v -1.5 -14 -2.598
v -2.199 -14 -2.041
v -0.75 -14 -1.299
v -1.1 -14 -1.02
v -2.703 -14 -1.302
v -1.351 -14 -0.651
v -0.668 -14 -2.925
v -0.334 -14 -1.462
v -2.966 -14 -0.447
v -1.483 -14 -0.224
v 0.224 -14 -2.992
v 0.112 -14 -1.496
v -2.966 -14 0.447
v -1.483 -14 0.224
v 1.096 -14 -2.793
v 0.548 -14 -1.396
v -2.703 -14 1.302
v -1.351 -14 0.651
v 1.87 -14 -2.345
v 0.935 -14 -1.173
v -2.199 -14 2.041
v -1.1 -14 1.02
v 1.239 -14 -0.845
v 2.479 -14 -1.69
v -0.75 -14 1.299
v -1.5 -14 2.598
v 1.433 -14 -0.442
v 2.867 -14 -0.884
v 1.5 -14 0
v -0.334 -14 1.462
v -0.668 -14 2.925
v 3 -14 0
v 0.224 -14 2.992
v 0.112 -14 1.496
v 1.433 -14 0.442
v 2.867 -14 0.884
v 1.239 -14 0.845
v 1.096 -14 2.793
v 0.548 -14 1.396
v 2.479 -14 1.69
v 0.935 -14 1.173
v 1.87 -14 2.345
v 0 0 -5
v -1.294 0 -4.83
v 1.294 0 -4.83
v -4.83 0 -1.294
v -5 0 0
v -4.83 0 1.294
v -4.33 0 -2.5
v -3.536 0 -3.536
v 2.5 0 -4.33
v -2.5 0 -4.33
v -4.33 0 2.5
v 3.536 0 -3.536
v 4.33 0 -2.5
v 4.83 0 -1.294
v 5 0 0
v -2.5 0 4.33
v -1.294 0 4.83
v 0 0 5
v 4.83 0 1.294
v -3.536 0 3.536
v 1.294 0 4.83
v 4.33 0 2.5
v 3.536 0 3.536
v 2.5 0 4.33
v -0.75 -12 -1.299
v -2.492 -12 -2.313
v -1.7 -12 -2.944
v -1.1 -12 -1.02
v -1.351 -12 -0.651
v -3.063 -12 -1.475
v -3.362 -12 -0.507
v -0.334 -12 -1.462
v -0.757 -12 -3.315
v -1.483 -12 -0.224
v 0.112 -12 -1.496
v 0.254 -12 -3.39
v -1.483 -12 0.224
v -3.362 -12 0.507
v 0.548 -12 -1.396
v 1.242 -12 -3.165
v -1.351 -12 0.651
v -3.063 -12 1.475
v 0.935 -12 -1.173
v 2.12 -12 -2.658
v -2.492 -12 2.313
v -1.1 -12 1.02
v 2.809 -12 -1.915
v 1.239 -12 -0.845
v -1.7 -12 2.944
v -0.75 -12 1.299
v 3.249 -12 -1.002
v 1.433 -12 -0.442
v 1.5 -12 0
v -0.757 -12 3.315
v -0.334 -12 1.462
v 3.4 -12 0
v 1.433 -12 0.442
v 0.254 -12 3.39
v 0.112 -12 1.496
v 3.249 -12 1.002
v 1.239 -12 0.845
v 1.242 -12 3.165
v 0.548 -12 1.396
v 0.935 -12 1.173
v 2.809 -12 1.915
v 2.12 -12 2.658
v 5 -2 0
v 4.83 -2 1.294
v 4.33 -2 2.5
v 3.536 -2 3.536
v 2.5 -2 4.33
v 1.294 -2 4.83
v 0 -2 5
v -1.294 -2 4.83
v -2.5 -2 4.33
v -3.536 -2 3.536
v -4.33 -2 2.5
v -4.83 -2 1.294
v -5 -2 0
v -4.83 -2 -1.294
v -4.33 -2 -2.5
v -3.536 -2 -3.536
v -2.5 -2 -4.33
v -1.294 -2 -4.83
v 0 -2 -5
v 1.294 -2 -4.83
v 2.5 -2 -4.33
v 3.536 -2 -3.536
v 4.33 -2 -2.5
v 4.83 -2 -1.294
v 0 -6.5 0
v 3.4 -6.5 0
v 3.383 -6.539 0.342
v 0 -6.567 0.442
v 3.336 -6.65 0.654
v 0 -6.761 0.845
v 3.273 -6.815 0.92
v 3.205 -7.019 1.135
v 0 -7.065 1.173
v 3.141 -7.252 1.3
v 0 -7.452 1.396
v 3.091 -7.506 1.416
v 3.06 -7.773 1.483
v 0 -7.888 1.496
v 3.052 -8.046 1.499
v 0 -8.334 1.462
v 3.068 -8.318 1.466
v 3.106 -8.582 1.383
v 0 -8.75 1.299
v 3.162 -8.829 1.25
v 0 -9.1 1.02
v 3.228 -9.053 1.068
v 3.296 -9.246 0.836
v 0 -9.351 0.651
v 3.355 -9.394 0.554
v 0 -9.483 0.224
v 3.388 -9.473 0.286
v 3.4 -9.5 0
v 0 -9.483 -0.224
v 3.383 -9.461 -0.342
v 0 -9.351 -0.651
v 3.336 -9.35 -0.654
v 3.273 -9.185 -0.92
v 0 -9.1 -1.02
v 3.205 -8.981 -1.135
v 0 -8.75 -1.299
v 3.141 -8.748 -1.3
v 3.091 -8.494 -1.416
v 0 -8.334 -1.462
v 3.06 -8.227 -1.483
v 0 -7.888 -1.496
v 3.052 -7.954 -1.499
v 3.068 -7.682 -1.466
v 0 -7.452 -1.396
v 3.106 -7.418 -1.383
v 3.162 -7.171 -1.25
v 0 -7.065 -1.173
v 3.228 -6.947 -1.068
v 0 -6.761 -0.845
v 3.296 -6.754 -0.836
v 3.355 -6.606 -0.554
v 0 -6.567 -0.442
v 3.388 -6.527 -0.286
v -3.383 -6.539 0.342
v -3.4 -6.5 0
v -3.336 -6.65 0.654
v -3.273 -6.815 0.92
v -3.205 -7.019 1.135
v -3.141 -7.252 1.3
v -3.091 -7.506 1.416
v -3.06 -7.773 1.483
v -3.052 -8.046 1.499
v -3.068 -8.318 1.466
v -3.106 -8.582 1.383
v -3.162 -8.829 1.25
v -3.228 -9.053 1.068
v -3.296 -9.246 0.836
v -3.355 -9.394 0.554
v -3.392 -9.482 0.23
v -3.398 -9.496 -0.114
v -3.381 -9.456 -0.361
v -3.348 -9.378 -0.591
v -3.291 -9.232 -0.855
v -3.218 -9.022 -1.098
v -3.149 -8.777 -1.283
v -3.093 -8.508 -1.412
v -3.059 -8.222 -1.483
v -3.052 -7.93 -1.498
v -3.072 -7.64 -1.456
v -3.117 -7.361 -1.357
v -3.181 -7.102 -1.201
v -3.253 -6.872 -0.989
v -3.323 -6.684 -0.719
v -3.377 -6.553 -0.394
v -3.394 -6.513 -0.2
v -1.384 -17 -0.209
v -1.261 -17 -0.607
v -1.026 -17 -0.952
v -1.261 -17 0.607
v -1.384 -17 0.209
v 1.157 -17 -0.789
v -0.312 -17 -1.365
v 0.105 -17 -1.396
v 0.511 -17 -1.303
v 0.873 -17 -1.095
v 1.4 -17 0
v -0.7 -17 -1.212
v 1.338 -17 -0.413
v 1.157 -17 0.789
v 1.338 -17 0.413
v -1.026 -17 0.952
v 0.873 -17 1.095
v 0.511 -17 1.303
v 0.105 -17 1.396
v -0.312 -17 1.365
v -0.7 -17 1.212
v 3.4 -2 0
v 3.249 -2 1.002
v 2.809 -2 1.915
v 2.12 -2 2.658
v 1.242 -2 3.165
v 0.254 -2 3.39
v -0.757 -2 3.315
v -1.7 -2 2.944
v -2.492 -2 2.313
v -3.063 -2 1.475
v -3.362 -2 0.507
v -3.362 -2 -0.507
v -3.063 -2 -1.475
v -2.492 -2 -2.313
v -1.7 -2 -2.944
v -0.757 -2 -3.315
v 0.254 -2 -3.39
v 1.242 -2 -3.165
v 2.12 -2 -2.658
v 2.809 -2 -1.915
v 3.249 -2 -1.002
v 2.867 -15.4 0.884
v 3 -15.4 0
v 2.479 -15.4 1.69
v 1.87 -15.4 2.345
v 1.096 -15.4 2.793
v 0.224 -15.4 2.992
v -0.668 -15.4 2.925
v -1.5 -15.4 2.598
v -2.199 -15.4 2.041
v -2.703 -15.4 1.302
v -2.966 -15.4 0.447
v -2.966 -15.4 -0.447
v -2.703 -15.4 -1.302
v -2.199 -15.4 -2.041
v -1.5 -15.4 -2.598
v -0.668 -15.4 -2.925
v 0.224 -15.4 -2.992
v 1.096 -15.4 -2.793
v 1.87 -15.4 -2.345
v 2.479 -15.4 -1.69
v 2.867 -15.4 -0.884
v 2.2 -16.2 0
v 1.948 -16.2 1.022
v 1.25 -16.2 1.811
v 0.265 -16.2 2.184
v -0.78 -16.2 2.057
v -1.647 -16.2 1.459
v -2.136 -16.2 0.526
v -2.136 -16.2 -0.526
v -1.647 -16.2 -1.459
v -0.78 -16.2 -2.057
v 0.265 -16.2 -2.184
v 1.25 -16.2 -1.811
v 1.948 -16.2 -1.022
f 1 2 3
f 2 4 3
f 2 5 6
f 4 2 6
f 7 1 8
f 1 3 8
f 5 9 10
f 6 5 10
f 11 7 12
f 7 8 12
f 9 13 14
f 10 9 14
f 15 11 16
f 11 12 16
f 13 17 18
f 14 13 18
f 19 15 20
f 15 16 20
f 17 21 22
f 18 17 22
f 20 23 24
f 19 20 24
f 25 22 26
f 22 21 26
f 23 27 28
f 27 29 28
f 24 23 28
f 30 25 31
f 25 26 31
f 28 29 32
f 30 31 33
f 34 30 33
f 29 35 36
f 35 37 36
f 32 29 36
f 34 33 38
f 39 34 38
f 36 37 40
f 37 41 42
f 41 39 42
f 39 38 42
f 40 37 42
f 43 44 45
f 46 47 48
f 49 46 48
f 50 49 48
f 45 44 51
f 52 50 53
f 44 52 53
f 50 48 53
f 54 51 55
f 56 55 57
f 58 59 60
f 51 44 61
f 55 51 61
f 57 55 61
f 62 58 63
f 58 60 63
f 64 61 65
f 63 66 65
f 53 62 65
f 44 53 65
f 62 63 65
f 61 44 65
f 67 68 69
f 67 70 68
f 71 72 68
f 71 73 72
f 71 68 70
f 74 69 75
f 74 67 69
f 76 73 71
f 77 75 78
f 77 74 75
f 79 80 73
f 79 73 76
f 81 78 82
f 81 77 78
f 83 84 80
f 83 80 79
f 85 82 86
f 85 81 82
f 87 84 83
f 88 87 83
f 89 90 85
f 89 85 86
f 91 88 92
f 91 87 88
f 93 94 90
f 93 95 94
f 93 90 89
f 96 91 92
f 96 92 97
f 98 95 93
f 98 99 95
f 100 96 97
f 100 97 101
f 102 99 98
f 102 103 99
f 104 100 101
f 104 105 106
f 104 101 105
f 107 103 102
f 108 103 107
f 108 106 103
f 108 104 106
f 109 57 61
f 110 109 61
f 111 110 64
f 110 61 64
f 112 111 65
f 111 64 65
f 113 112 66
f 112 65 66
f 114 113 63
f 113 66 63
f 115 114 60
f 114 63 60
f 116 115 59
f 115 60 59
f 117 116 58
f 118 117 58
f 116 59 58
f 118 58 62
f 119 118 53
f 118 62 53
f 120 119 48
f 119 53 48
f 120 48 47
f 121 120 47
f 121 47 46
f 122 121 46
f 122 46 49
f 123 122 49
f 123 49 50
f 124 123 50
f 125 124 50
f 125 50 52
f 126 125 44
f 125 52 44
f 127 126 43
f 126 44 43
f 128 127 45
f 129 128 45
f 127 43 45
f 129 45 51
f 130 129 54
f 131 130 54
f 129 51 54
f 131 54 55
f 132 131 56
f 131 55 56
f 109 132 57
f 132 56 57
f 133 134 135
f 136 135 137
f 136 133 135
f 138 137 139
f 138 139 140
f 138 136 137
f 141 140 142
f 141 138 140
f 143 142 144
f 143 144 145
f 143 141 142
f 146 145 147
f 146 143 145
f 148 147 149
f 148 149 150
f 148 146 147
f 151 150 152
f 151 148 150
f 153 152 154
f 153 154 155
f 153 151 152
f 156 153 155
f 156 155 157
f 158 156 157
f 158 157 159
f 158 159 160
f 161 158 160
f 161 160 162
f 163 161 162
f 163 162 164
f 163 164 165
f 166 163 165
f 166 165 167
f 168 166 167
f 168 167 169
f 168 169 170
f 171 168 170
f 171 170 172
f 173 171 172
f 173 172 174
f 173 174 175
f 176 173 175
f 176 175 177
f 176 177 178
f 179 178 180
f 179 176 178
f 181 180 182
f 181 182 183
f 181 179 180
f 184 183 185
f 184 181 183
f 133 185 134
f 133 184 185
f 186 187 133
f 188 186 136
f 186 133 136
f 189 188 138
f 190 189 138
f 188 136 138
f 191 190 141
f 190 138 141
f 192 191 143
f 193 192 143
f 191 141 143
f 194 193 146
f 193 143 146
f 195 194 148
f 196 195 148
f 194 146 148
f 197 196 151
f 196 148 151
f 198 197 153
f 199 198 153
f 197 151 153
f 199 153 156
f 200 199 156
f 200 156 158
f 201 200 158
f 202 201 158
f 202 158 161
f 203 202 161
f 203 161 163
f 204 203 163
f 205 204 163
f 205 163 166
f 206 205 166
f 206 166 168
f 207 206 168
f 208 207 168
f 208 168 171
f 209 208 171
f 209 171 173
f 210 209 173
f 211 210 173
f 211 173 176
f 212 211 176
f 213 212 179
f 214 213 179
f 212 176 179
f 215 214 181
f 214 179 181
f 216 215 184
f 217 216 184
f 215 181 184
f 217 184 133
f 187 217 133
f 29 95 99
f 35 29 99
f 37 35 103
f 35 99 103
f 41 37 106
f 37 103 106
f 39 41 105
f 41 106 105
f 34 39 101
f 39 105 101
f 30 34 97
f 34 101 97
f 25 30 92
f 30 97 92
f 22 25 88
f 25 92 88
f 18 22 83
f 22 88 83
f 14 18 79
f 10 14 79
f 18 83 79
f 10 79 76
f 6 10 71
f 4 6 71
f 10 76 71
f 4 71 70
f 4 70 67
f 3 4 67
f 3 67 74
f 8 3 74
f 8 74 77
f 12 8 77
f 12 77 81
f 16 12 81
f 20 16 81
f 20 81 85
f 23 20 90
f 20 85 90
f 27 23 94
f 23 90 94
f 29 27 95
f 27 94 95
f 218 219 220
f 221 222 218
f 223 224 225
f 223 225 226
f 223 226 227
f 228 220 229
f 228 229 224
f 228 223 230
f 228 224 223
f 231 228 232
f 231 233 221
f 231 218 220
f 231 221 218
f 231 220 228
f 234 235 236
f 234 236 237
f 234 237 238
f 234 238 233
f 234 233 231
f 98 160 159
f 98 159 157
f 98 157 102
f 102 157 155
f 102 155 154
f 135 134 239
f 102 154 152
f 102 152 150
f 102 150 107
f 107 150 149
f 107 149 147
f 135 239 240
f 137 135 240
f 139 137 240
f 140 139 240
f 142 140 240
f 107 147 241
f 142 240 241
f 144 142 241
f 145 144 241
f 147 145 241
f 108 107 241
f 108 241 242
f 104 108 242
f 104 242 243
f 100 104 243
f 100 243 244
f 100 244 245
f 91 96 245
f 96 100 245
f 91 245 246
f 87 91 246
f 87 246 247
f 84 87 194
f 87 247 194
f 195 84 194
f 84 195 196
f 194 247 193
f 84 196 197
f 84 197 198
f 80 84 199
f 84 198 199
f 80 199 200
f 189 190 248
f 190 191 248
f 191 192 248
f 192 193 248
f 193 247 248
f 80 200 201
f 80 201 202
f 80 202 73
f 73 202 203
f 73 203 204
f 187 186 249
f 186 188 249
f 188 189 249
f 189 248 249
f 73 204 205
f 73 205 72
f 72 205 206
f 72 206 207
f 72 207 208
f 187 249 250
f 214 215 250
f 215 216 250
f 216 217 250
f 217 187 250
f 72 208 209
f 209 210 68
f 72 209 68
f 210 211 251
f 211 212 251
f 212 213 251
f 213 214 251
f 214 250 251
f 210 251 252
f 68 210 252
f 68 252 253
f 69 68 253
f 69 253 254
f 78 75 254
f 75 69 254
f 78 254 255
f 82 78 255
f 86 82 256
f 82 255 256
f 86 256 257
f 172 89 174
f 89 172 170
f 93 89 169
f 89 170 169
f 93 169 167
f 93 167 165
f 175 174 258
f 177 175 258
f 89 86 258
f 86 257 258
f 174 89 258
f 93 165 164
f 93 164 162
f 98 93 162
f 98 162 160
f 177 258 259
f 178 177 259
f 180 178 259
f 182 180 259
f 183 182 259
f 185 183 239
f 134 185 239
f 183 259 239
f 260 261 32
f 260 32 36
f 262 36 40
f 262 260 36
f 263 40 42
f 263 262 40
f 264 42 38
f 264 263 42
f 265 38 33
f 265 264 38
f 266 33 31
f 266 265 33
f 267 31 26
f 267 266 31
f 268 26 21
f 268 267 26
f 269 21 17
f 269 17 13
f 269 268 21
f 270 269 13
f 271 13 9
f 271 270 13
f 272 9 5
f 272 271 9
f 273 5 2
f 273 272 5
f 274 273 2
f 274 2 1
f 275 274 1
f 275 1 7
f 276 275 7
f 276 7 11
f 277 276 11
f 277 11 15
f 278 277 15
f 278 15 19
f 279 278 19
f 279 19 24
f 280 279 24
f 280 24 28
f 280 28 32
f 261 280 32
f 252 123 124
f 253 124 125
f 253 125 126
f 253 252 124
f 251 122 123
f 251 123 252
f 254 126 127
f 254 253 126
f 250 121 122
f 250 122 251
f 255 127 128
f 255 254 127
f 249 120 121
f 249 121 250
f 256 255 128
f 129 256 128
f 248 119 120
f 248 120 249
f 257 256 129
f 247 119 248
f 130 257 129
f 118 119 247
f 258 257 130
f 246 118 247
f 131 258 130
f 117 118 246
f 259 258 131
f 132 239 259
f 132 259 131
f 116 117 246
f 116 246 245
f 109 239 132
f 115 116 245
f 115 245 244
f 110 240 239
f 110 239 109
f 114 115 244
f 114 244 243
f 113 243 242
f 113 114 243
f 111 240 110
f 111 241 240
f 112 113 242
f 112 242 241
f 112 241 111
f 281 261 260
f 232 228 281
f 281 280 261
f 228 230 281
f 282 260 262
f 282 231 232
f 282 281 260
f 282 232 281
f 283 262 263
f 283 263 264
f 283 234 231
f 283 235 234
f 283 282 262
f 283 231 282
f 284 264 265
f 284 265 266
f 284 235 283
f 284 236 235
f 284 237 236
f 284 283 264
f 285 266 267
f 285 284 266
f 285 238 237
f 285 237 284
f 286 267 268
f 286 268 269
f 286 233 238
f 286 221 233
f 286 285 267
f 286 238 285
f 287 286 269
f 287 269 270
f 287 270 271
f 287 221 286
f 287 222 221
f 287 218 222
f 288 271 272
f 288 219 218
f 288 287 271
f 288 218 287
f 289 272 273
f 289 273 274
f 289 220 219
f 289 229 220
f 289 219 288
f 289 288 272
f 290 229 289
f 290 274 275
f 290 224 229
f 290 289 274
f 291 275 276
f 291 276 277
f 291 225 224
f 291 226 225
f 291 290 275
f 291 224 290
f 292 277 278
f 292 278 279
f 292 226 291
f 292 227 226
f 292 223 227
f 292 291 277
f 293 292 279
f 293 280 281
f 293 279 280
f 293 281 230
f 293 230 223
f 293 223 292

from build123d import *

# Parameters (mm, degrees)
F0_R          = 5
F1_DEPTH      = 2
F2_R          = 3.4
F3_DEPTH      = 15
F5_R          = 3.75
F5_R_2        = 1.5
F6_DEPTH      = 2
F7_R          = 1.5
F8_DEPTH      = 25
F8_DEPTH_BACK = 25
F9_SIZE       = 2
F10_R         = 3.5
F10_R_2       = 3
F11_DEPTH     = 5


with BuildPart() as f1:
    # F0 (on Front) → F1 (new body)
    with BuildSketch(Plane.XZ):
        Circle(F0_R)
    extrude(amount=F1_DEPTH)

    # F2 (on face) → F3 (join)
    with BuildSketch(Plane.XZ.offset(2)):
        Circle(F2_R)
    extrude(amount=F3_DEPTH)

    # F5 (on offset) → F6 (cut)
    with BuildSketch(Plane.XZ.offset(12)):
        Circle(F5_R)
        Circle(F5_R_2, mode=Mode.SUBTRACT)
    extrude(amount=F6_DEPTH, mode=Mode.SUBTRACT)

    # F7 (on Right) → F8 (cut, two sides)
    with BuildSketch(Plane.YZ) as f8_sk:
        with Locations((-8, 0)):
            Circle(F7_R)
    extrude(amount=F8_DEPTH, mode=Mode.SUBTRACT)
    extrude(f8_sk.sketch, amount=-F8_DEPTH_BACK, mode=Mode.SUBTRACT)

    # F9
    f9_edges = [f1.edges().sort_by_distance(p)[0] for p in [
        (-3.4, -17, 0),
    ]]
    chamfer(f9_edges, length=F9_SIZE)

    # F10 (on face) → F11 (cut)
    with BuildSketch(Plane.XZ.offset(17)):
        Circle(F10_R)
        Circle(F10_R_2, mode=Mode.SUBTRACT)
    extrude(amount=-F11_DEPTH, mode=Mode.SUBTRACT)


solid = f1.part
